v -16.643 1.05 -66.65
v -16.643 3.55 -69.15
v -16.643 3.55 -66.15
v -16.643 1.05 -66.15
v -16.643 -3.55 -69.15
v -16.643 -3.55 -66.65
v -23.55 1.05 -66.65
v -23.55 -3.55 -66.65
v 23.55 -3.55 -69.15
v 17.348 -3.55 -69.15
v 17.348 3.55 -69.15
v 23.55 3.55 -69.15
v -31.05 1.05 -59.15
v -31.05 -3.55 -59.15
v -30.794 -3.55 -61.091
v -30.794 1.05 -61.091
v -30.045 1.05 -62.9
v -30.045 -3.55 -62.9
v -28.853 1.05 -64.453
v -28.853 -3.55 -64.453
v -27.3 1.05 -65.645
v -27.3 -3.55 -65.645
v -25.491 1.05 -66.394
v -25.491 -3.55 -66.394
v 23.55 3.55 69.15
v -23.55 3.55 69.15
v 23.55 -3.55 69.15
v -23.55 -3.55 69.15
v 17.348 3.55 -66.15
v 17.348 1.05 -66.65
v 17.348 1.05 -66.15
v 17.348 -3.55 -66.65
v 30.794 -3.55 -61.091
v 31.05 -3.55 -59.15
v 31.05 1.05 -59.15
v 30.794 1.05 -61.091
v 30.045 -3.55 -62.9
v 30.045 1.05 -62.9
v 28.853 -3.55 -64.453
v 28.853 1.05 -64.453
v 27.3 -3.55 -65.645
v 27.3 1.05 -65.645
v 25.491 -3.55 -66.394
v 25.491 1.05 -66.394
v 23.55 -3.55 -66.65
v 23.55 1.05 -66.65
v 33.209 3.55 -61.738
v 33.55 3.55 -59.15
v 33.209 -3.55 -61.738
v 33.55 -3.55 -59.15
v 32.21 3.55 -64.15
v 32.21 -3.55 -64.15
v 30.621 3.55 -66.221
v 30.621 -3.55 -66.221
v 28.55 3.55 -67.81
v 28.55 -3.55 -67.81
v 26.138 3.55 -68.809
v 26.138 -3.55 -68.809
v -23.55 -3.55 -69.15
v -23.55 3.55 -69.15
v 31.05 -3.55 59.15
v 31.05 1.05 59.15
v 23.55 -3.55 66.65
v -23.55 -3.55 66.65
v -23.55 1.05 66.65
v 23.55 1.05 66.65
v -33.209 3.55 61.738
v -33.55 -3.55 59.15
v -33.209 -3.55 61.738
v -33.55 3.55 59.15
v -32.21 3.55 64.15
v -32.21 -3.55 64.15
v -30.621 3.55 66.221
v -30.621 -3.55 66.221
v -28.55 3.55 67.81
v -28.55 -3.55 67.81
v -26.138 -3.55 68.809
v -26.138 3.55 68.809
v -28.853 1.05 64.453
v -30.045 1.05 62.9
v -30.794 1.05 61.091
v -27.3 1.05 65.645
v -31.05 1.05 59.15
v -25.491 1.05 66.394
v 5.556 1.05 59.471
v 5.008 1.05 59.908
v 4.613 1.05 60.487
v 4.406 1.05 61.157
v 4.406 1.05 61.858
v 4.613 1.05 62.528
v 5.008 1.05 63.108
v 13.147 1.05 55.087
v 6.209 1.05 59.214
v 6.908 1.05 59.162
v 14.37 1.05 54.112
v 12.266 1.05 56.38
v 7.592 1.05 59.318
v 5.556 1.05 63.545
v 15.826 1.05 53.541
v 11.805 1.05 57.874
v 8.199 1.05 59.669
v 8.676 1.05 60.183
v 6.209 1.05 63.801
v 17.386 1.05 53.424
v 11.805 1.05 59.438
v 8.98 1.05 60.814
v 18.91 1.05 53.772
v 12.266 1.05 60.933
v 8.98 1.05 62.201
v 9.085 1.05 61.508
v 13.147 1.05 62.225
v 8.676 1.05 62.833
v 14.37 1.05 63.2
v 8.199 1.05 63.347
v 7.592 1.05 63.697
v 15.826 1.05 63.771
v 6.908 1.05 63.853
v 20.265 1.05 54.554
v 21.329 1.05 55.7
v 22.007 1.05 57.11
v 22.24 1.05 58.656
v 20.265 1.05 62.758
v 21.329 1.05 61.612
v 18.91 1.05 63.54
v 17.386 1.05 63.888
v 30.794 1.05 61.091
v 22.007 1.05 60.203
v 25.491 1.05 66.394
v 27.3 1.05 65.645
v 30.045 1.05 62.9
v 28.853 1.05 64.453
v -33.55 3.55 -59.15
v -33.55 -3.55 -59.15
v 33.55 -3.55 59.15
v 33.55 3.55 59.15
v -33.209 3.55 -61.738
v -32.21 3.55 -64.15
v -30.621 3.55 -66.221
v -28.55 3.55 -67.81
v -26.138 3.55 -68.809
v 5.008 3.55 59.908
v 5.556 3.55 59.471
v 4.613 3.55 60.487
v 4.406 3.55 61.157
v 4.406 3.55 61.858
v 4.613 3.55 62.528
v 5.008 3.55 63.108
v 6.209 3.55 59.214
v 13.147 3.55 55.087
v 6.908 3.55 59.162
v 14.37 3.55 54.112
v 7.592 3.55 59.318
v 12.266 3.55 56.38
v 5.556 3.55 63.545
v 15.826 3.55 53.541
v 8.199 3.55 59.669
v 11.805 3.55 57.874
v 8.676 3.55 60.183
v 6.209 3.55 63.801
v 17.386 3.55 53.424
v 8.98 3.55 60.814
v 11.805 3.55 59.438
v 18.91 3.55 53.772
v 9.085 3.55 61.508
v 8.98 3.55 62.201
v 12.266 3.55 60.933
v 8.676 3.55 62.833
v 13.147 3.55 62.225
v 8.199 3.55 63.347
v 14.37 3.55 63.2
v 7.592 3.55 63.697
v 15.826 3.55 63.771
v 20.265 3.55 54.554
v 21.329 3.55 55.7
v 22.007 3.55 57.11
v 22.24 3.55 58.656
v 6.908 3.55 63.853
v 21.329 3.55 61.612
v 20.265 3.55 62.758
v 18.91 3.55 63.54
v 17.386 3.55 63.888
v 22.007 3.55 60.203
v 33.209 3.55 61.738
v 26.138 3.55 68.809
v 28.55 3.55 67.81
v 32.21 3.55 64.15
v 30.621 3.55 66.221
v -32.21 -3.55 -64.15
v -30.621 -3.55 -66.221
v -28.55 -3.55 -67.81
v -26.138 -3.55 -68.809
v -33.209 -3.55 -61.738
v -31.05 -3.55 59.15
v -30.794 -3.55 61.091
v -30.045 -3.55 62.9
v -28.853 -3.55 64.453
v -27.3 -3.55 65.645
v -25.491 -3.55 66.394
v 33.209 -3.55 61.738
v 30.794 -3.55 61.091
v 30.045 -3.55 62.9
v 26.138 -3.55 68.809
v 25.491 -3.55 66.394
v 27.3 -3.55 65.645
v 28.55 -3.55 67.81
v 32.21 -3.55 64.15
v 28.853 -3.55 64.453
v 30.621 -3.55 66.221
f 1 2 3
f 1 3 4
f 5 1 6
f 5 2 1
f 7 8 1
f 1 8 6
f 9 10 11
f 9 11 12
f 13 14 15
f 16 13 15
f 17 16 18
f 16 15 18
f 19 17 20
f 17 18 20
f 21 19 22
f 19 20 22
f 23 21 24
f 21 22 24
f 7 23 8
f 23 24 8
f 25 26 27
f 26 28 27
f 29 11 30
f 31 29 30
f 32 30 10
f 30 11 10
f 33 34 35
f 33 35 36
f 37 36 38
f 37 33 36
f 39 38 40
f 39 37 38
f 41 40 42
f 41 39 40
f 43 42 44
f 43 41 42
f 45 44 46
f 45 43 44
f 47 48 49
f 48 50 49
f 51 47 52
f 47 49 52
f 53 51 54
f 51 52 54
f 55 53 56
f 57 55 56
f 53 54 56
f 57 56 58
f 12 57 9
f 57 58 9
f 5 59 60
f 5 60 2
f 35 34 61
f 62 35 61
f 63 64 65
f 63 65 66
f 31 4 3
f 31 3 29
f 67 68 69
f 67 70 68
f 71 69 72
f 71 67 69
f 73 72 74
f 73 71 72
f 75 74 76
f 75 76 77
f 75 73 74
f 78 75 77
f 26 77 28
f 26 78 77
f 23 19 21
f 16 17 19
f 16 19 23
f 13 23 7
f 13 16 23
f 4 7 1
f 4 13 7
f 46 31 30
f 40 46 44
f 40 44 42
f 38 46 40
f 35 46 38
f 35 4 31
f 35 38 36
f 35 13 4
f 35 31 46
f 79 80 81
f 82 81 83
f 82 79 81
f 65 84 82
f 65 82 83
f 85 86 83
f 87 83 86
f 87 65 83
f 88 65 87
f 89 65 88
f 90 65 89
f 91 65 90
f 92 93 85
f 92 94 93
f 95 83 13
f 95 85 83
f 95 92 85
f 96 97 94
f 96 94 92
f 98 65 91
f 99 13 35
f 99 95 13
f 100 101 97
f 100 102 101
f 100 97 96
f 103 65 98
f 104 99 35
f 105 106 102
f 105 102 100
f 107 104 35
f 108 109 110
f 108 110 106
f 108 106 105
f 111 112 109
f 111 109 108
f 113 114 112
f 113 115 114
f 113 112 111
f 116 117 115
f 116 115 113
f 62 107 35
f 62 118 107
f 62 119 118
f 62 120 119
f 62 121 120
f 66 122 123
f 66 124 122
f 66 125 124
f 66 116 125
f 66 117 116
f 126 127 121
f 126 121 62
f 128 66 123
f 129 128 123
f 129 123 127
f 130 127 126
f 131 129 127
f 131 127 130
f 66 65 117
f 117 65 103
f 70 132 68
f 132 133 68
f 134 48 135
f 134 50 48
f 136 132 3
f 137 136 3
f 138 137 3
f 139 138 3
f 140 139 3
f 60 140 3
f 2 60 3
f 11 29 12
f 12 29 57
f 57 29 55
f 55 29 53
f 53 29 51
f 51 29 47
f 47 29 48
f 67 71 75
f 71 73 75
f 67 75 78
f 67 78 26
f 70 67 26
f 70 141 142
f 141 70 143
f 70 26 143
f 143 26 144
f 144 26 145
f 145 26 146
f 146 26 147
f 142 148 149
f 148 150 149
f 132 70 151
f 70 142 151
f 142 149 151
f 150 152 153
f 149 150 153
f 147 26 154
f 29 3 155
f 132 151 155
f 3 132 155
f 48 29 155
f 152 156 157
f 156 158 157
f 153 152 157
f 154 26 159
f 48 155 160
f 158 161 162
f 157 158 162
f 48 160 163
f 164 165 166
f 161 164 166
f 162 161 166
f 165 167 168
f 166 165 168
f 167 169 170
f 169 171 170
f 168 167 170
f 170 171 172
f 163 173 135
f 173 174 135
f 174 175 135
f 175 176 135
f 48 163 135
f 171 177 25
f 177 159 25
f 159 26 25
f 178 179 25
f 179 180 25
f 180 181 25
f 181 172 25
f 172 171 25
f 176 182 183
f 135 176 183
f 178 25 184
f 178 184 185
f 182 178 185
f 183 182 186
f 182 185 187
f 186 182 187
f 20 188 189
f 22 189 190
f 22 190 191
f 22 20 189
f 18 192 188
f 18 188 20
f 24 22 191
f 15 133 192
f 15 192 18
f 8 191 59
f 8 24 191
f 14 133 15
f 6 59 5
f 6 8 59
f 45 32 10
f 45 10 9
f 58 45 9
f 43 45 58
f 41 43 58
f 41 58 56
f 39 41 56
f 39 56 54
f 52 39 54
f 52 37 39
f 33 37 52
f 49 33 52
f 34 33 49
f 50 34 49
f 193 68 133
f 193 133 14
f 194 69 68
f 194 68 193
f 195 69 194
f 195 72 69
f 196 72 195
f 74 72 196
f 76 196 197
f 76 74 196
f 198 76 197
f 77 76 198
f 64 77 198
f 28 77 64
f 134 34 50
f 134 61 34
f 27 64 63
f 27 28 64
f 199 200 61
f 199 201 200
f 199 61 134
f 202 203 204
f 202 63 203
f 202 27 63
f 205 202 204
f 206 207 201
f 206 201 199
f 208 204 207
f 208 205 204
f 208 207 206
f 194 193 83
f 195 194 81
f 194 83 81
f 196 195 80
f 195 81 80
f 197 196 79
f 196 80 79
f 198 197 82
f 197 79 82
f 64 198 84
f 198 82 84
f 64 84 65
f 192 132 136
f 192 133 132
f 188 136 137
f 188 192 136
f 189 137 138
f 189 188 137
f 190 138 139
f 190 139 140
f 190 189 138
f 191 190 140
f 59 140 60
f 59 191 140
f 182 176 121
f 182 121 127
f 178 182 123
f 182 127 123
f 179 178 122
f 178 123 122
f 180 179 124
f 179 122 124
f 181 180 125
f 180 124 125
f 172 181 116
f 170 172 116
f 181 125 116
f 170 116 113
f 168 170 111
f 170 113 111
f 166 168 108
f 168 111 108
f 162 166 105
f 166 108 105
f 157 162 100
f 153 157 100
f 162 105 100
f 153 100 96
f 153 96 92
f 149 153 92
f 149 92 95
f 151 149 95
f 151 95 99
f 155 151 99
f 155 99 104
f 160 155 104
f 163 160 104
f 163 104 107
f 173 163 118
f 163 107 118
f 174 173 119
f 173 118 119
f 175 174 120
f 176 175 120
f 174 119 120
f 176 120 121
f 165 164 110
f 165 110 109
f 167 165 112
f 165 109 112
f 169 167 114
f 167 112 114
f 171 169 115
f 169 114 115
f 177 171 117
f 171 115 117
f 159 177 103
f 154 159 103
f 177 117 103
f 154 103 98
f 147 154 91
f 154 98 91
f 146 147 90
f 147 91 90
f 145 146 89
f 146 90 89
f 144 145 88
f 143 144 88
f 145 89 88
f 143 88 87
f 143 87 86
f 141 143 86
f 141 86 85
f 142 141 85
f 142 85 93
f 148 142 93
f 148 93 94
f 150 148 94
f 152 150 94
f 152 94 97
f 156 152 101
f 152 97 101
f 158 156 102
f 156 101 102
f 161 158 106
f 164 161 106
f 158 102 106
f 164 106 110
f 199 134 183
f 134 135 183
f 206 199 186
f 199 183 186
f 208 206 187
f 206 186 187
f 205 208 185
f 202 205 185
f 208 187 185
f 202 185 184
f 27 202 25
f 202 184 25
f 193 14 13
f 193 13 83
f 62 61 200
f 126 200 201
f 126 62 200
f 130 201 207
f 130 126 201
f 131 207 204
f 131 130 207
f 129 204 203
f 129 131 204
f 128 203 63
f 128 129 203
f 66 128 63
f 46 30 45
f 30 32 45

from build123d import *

# Parameters (mm, degrees)
F0_W     = 67.1
F0_H     = 138.3
F1_DEPTH = 3.55
F2_R     = 10
F3_T     = -2.5
F4_R     = 5.246846
F5_DEPTH = 12.5
F6_W     = 33.990787
F6_H     = 7.1
F7_DEPTH = 3
F8_R     = 2.352269
F9_DEPTH = 12.5


with BuildPart() as f1:
    # F0 (on Front) → F1 (new body, symmetric)
    with BuildSketch(Plane.XZ):
        Rectangle(F0_W, F0_H)
    extrude(amount=F1_DEPTH, both=True)

    # F2
    f2_edges = [f1.edges().sort_by_distance(p)[0] for p in [
        (33.55, 0, -69.15),
        (33.55, 0, 69.15),
        (-33.55, 0, -69.15),
        (-33.55, 0, 69.15),
    ]]
    fillet(f2_edges, radius=F2_R)

    # F3
    f3_openings = [f1.faces().sort_by_distance(p)[0] for p in [
        (0, -3.55, 0),
    ]]
    offset(amount=F3_T, openings=f3_openings)

    # F4 (on Front) → F5 (cut, symmetric)
    with BuildSketch(Plane.XZ):
        with Locations((16.993571, 58.656055)):
            Circle(F4_R)
    extrude(amount=F5_DEPTH, both=True, mode=Mode.SUBTRACT)

    # F6 (on face) → F7 (cut, symmetric)
    with BuildSketch(Plane(origin=(0, 0, -69.15), x_dir=(1, 0, 0), z_dir=(0, 0, -1))):
        with Locations((0.352152, 0)):
            Rectangle(F6_W, F6_H)
    extrude(amount=F7_DEPTH, both=True, mode=Mode.SUBTRACT)

    # F8 (on Front) → F9 (cut, symmetric)
    with BuildSketch(Plane.XZ):
        with Locations((6.732481, 61.507728)):
            Circle(F8_R)
    extrude(amount=F9_DEPTH, both=True, mode=Mode.SUBTRACT)


solid = f1.part
